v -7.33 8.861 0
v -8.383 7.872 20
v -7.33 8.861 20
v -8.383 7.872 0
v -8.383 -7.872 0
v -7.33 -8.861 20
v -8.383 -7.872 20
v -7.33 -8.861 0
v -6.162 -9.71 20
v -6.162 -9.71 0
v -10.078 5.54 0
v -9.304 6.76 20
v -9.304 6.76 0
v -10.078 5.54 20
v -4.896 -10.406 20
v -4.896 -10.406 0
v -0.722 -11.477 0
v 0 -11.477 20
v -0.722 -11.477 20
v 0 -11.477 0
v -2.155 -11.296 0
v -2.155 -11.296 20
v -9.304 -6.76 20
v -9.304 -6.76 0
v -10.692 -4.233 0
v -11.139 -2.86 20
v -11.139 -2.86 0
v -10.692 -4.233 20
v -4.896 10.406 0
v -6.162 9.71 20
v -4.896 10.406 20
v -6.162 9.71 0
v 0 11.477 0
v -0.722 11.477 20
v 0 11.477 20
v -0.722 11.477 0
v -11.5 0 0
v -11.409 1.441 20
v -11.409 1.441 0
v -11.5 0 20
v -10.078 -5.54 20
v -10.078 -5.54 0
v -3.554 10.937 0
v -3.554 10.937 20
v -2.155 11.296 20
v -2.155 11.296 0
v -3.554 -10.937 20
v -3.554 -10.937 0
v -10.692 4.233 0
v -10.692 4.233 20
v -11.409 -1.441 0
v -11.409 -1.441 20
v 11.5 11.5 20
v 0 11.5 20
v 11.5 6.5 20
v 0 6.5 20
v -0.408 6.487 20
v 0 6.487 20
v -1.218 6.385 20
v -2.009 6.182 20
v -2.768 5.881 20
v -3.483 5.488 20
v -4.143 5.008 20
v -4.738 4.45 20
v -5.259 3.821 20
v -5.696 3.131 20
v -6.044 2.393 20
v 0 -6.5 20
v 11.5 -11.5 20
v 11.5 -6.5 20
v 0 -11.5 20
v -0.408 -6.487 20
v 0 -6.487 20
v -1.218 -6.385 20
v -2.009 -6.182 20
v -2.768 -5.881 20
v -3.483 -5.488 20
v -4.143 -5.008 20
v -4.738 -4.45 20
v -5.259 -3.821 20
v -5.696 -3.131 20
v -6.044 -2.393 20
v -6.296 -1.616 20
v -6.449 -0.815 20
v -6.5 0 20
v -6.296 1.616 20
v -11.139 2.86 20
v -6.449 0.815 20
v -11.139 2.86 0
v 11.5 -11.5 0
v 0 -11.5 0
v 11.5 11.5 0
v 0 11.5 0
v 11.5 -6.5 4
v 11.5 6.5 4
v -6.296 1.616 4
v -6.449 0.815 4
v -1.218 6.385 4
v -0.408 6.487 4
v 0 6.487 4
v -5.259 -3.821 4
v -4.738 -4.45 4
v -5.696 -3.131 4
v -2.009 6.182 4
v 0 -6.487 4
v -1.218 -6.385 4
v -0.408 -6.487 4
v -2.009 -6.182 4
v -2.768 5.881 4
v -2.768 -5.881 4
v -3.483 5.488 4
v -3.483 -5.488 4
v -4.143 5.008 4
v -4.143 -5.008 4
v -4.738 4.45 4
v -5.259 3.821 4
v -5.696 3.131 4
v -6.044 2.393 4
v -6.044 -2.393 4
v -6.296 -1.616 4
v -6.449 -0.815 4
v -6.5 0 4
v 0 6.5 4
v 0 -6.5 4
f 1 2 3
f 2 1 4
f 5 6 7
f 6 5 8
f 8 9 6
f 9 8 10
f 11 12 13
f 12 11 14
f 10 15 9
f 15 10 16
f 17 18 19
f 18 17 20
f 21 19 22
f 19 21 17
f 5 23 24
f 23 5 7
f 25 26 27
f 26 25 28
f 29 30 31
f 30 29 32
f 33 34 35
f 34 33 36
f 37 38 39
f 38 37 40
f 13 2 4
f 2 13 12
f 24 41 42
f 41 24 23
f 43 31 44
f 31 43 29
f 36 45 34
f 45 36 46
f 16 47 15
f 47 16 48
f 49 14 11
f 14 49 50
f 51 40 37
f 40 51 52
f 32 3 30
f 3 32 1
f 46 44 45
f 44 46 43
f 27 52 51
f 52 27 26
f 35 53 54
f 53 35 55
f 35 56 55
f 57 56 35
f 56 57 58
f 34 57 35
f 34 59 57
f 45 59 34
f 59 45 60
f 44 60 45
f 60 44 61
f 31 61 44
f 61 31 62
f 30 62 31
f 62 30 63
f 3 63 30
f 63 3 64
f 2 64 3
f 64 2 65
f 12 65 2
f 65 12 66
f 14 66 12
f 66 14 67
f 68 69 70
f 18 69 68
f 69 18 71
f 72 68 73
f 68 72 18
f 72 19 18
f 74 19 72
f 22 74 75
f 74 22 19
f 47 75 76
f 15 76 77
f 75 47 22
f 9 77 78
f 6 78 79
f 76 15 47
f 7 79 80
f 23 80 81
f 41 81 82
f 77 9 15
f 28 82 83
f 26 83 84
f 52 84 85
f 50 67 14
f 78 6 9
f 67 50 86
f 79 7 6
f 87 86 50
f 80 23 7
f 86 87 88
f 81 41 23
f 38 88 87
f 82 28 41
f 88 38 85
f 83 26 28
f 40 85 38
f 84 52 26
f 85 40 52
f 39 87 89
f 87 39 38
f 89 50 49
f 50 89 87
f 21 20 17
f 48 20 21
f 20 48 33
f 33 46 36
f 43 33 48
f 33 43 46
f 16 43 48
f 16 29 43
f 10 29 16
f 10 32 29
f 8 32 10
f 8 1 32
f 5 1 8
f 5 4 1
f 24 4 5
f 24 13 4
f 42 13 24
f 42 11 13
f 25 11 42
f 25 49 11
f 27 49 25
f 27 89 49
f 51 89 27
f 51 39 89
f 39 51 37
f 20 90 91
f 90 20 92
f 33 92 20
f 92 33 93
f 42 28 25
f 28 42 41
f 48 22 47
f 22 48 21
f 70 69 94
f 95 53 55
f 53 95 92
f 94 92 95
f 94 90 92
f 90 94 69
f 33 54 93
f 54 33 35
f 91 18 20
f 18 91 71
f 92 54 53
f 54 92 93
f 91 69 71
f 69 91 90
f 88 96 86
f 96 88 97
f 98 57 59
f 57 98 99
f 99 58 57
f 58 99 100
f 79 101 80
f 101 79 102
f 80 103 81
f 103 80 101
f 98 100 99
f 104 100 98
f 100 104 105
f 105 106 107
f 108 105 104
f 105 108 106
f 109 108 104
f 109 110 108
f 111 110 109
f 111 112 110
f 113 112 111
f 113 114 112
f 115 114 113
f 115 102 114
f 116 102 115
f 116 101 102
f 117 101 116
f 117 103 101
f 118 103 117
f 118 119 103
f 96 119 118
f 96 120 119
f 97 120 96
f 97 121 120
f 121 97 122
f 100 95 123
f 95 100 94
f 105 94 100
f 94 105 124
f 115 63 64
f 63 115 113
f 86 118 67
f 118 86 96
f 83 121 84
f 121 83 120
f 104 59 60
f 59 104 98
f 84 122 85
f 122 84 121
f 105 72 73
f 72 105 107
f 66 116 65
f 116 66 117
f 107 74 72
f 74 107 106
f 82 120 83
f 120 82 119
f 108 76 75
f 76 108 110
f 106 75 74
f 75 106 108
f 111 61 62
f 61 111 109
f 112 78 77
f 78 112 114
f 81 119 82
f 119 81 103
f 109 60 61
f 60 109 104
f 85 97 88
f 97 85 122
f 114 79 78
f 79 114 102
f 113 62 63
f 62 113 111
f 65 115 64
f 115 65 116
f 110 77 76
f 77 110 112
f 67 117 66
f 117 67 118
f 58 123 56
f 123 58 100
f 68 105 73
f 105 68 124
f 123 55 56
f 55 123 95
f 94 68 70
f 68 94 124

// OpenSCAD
// The diameter of the dowel hole in mm (you may want to add a mm or two for clearance)
dowel_d = 13;

// The diameter of the flange for mounting the dowel holder (in mm)
flange_d = 0;

/* [Dowel Customization] */

// The height of the dowel holder in mm (inclusive of the height of the flange)
dowel_h = 20;

// The thickness of the wall holding the dowele in mm
dowel_wall = 5;

/* [Flange Customization] */

// The height of the flange in mm
flange_h = 4;

// The diameter (in mm) for the holes placed for mounting the holder (0 disables the holes)
flange_hole_d = 6;

/* [Hidden] */

holder_d = dowel_d + dowel_wall*2;
$fn = 50;

module holder() {
    difference() {
        union() {
            cylinder(d = holder_d, h=dowel_h);
            translate([0, -holder_d/2, 0]) cube([dowel_d/2 + dowel_wall, holder_d, dowel_h]);
        }
        translate([0, 0, flange_h]) union() {
            cylinder(d=dowel_d, h=100);
            translate([0, -dowel_d/2, 0]) cube([100, dowel_d, 100]);
        }
    }
}

module flange() {
    difference() {
        cylinder(d = flange_d, h = flange_h);
        if (flange_hole_d > 0) {
            for (xy = [ [0, 1], [-1, 0], [0, -1] ]) {
                delta = (holder_d + (flange_d - holder_d)/2)/2;
                translate([xy[0] * delta, xy[1] * delta, 0]) cylinder(d=flange_hole_d, h=100);
            }
        }
    }
}

holder();
if (flange_d > 0) {
    flange();
}
